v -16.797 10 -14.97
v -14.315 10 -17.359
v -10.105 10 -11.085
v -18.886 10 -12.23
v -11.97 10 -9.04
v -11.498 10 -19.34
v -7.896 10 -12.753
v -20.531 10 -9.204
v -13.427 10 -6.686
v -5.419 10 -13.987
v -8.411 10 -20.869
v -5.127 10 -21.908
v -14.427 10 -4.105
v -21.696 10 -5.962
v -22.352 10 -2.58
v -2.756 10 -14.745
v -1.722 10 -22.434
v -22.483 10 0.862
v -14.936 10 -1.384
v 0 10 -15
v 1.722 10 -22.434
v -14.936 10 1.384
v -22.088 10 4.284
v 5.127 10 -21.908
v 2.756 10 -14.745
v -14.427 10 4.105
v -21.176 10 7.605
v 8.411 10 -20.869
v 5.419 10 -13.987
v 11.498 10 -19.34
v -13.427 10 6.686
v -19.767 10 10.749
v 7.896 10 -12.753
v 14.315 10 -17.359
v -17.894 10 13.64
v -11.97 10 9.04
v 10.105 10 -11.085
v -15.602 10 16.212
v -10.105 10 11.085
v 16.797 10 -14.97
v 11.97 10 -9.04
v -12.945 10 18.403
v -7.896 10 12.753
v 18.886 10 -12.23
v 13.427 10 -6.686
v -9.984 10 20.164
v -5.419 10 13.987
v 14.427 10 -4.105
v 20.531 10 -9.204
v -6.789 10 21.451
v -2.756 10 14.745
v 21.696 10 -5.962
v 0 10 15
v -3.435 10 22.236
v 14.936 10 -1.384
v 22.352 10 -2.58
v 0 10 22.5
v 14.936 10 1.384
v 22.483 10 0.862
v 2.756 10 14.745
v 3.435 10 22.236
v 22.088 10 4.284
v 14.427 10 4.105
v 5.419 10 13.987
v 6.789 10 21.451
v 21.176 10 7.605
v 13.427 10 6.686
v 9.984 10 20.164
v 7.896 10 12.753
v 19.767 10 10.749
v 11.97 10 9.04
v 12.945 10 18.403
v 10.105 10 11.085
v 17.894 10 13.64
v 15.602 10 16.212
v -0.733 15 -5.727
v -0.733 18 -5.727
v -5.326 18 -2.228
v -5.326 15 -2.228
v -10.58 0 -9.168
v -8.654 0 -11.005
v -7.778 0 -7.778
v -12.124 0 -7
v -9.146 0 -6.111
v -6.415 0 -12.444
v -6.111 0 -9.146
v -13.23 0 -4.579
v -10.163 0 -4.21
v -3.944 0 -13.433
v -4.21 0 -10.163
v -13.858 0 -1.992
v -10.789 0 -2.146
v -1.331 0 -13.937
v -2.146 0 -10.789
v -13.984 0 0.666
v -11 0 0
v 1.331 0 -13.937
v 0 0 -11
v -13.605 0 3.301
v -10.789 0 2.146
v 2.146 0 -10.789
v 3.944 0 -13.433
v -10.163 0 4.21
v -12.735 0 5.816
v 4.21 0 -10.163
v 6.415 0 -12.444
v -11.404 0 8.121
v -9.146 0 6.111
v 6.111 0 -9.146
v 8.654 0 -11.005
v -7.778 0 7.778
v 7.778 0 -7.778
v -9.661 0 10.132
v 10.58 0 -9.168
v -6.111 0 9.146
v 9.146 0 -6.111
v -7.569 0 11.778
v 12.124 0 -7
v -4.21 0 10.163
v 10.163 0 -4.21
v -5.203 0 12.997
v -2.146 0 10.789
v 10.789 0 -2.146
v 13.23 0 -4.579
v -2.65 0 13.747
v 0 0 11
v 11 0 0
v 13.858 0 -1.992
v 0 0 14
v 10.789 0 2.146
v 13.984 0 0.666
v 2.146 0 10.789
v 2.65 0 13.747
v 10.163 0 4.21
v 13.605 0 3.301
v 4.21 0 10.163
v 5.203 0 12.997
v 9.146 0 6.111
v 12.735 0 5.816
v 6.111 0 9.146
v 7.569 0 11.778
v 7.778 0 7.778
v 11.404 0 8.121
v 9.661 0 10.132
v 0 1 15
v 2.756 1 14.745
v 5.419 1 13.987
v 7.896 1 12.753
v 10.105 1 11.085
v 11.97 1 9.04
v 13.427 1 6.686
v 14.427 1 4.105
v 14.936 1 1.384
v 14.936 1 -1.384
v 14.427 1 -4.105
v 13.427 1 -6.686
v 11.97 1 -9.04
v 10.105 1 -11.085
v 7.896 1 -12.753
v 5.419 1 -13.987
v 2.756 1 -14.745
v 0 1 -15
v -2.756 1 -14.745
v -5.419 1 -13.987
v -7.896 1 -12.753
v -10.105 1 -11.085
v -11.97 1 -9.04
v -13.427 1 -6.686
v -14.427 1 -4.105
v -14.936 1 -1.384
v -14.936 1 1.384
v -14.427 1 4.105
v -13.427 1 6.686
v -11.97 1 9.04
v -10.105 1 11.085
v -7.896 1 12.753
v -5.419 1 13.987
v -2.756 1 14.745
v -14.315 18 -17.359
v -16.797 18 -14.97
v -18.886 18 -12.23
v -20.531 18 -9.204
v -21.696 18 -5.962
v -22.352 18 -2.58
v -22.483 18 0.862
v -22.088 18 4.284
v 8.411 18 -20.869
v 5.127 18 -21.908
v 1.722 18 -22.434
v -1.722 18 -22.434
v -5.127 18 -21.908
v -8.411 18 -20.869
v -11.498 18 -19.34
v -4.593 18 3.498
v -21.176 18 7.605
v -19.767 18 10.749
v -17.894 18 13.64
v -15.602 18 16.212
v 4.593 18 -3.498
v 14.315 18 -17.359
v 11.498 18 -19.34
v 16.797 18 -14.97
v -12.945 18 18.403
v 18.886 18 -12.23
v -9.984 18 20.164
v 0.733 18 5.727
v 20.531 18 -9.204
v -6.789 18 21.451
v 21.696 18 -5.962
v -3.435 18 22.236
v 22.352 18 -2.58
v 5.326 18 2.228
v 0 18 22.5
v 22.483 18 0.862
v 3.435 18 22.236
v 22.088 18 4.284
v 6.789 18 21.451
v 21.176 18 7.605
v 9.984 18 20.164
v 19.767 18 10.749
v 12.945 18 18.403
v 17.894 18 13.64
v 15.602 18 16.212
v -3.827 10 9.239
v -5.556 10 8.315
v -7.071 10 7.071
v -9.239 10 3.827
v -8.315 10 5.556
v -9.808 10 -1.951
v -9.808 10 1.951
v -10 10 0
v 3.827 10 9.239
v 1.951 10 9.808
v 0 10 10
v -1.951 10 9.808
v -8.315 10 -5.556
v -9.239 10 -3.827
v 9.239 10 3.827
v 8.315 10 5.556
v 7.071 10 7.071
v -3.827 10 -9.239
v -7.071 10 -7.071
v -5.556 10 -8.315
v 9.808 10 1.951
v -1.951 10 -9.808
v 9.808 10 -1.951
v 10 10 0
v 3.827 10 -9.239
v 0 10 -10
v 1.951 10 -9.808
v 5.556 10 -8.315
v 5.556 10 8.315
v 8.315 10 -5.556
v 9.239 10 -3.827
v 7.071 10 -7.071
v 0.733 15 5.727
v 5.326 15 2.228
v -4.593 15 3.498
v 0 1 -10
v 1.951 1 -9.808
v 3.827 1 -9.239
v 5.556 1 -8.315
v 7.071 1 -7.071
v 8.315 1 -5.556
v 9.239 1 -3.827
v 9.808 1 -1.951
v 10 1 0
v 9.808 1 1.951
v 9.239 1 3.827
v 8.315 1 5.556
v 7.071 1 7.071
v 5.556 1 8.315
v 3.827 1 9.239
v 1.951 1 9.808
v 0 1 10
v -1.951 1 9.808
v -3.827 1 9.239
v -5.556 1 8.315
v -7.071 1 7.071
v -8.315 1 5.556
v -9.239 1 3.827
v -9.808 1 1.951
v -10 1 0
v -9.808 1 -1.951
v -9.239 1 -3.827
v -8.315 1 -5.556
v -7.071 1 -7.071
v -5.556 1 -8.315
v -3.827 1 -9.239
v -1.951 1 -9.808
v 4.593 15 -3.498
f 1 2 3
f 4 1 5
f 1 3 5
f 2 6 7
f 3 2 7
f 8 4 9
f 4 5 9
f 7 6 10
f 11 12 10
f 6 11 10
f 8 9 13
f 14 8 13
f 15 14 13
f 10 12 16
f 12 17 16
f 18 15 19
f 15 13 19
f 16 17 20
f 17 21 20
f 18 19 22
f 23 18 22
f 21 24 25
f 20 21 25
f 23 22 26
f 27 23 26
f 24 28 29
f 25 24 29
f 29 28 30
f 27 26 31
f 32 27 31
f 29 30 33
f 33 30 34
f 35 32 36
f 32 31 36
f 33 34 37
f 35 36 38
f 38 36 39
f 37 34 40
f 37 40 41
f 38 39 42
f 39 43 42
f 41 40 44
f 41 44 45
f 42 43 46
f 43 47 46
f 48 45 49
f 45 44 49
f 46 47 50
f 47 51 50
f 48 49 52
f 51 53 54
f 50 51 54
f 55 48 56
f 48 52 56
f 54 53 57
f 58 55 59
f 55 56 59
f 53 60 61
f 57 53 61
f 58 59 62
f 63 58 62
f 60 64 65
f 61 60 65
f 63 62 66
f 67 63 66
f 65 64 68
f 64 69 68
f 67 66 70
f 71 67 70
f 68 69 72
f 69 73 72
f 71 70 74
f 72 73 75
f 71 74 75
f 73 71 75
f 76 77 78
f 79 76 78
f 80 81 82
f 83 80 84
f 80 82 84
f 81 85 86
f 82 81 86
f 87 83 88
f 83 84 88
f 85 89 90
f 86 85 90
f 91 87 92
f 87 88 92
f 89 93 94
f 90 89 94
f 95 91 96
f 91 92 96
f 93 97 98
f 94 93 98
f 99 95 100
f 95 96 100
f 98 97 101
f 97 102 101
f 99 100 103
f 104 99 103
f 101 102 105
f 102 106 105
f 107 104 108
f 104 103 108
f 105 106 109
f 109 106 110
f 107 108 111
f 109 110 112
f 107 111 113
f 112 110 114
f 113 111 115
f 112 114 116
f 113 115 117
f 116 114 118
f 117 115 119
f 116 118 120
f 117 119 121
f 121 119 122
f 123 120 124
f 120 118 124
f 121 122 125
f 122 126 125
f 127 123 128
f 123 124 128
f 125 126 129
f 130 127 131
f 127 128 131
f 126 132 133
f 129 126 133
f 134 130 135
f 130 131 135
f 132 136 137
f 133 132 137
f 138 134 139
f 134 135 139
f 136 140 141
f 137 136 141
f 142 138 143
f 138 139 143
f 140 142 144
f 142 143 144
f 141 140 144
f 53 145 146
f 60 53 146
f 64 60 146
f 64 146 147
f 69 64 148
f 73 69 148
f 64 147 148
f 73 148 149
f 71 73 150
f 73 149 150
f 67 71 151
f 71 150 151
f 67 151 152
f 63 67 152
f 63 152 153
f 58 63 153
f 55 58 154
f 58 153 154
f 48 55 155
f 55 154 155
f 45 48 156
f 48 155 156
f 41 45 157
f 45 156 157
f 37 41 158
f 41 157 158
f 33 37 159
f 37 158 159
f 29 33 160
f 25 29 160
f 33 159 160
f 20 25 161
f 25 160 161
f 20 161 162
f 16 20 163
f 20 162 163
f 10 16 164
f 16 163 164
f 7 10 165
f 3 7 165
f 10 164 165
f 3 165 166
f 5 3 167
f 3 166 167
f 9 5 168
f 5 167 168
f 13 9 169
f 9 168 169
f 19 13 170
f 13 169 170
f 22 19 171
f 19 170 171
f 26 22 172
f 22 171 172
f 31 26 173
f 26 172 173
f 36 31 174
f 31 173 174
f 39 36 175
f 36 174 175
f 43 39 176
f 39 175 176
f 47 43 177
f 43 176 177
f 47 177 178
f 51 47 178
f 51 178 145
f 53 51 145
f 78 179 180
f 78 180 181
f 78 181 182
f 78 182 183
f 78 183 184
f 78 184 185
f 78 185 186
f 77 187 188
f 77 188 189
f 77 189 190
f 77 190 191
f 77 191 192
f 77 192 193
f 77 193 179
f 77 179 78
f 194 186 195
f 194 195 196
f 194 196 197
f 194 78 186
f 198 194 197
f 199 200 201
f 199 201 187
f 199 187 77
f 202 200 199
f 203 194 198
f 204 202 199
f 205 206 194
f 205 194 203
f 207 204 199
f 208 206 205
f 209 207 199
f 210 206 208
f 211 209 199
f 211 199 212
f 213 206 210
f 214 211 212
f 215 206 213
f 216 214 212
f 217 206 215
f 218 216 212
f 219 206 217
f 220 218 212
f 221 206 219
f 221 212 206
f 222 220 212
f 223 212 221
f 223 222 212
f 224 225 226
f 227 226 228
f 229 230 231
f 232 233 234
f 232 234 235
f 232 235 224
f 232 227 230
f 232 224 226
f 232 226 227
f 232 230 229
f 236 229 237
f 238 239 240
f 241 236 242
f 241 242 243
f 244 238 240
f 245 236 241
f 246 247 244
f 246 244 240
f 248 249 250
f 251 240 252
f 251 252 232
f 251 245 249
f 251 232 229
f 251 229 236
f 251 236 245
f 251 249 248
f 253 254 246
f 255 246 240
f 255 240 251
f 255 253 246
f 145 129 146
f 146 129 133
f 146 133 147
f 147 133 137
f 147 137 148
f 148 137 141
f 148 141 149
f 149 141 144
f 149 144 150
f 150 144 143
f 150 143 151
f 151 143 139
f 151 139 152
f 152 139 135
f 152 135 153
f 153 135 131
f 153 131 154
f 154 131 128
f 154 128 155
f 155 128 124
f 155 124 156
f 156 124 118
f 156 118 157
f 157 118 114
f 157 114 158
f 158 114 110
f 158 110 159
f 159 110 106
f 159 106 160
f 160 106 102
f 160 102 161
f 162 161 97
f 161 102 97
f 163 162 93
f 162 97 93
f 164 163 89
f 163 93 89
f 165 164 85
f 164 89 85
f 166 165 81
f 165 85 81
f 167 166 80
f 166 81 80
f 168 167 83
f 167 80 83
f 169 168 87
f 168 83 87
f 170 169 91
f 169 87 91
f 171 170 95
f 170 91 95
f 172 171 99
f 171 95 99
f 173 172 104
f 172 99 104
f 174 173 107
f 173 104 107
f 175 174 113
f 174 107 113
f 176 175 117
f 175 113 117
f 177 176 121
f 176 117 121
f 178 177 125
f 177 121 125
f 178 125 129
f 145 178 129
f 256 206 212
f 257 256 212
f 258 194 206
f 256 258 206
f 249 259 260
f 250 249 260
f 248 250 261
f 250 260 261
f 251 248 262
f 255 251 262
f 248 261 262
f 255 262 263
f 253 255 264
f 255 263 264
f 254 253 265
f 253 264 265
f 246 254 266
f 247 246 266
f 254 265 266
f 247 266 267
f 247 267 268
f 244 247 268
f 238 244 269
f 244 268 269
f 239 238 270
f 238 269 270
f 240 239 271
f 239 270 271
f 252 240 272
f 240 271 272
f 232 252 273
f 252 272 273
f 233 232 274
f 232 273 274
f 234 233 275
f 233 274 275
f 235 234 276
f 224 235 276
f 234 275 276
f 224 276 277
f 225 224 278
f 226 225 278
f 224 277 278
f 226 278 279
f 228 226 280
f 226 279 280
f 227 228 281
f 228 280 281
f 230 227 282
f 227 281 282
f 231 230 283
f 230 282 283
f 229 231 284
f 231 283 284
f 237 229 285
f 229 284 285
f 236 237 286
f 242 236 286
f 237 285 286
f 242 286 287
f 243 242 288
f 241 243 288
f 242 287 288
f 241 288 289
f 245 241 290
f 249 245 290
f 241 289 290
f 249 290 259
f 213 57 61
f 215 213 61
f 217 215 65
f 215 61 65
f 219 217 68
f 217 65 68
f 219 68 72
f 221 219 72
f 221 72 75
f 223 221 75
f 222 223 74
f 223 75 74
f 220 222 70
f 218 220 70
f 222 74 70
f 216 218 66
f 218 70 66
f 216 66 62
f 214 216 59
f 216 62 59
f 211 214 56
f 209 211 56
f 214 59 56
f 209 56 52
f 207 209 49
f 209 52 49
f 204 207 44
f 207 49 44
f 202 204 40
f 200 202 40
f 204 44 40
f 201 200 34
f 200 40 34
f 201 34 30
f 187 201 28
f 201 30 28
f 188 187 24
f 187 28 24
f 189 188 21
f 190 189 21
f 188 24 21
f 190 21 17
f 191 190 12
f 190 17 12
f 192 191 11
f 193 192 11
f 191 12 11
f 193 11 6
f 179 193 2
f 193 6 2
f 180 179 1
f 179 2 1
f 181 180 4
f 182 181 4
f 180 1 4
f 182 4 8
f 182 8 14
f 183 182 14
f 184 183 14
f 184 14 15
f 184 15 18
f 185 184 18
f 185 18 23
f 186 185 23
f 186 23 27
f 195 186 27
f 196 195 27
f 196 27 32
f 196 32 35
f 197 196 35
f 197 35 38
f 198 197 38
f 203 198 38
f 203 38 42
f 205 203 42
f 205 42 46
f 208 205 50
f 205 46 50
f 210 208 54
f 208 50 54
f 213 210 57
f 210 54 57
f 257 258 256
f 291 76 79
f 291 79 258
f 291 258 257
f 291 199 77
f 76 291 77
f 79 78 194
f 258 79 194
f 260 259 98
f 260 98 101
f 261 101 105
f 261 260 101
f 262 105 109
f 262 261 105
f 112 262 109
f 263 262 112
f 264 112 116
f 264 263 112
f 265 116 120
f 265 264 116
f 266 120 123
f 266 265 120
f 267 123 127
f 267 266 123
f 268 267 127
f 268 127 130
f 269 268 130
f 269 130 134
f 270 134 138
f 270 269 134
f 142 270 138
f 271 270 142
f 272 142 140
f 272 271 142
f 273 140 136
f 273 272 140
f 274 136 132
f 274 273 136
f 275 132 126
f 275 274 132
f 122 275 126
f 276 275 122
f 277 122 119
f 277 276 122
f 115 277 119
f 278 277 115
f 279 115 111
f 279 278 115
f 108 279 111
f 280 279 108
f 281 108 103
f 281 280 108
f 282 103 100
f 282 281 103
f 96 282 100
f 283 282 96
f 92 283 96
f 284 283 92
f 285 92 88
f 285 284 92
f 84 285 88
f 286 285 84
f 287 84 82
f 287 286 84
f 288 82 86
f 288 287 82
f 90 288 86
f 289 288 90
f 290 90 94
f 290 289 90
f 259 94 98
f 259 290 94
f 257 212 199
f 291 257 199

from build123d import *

# Parameters (mm, degrees)
SKETCH1_R           = 15
BOSS_EXTRUDE1_DEPTH = 10
SKETCH2_R           = 22.5
BOSS_EXTRUDE2_DEPTH = 8
CHAMFER1_SIZE       = 1
SKETCH3_R           = 10
CUT_EXTRUDE1_DEPTH  = 10
CUT_EXTRUDE2_DEPTH  = 3
CHAMFER2_SIZE       = 1


with BuildPart() as part:
    # Sketch1 → Boss-Extrude1 (new body)
    with BuildSketch(Plane(origin=(0, 0, 0), x_dir=(1, 0, 0), z_dir=(0, 1, 0))):
        with Locations(Location((0, 0, 0), (0, 0, 270))):
            Circle(SKETCH1_R)
    extrude(amount=BOSS_EXTRUDE1_DEPTH)

    # Sketch2 → Boss-Extrude2 (add)
    with BuildSketch(Plane(origin=(0, 10, 0), x_dir=(1, 0, 0), z_dir=(0, 1, 0))):
        with Locations(Location((0, 0, 0), (0, 0, 270))):
            Circle(SKETCH2_R)
    extrude(amount=BOSS_EXTRUDE2_DEPTH)

    # Chamfer1
    chamfer1_edges = [part.edges().sort_by_distance(p)[0] for p in [
        (0, 0, -15),
    ]]
    chamfer(chamfer1_edges, length=CHAMFER1_SIZE)

    # Sketch3 → Cut-Extrude1 (cut)
    with BuildSketch(Plane.XZ):
        with Locations(Location((0, 0, 0), (0, 0, 270))):
            Circle(SKETCH3_R)
    extrude(amount=-CUT_EXTRUDE1_DEPTH, mode=Mode.SUBTRACT)

    # Sketch4 → Cut-Extrude2 (cut)
    with BuildSketch(Plane(origin=(0, 18, 0), x_dir=(1, 0, 0), z_dir=(0, 1, 0))):
        Polygon((5.326189108, -2.228237625), (4.592804943, 3.49849626), (-0.733384165, 5.726733886), (-5.326189108, 2.228237625), (-4.592804943, -3.49849626), (0.733384165, -5.726733886), align=None)
    extrude(amount=-CUT_EXTRUDE2_DEPTH, mode=Mode.SUBTRACT)

    # Chamfer2
    chamfer2_edges = [part.edges().sort_by_distance(p)[0] for p in [
        (0, 0, 10),
    ]]
    chamfer(chamfer2_edges, length=CHAMFER2_SIZE)


solid = part.part
